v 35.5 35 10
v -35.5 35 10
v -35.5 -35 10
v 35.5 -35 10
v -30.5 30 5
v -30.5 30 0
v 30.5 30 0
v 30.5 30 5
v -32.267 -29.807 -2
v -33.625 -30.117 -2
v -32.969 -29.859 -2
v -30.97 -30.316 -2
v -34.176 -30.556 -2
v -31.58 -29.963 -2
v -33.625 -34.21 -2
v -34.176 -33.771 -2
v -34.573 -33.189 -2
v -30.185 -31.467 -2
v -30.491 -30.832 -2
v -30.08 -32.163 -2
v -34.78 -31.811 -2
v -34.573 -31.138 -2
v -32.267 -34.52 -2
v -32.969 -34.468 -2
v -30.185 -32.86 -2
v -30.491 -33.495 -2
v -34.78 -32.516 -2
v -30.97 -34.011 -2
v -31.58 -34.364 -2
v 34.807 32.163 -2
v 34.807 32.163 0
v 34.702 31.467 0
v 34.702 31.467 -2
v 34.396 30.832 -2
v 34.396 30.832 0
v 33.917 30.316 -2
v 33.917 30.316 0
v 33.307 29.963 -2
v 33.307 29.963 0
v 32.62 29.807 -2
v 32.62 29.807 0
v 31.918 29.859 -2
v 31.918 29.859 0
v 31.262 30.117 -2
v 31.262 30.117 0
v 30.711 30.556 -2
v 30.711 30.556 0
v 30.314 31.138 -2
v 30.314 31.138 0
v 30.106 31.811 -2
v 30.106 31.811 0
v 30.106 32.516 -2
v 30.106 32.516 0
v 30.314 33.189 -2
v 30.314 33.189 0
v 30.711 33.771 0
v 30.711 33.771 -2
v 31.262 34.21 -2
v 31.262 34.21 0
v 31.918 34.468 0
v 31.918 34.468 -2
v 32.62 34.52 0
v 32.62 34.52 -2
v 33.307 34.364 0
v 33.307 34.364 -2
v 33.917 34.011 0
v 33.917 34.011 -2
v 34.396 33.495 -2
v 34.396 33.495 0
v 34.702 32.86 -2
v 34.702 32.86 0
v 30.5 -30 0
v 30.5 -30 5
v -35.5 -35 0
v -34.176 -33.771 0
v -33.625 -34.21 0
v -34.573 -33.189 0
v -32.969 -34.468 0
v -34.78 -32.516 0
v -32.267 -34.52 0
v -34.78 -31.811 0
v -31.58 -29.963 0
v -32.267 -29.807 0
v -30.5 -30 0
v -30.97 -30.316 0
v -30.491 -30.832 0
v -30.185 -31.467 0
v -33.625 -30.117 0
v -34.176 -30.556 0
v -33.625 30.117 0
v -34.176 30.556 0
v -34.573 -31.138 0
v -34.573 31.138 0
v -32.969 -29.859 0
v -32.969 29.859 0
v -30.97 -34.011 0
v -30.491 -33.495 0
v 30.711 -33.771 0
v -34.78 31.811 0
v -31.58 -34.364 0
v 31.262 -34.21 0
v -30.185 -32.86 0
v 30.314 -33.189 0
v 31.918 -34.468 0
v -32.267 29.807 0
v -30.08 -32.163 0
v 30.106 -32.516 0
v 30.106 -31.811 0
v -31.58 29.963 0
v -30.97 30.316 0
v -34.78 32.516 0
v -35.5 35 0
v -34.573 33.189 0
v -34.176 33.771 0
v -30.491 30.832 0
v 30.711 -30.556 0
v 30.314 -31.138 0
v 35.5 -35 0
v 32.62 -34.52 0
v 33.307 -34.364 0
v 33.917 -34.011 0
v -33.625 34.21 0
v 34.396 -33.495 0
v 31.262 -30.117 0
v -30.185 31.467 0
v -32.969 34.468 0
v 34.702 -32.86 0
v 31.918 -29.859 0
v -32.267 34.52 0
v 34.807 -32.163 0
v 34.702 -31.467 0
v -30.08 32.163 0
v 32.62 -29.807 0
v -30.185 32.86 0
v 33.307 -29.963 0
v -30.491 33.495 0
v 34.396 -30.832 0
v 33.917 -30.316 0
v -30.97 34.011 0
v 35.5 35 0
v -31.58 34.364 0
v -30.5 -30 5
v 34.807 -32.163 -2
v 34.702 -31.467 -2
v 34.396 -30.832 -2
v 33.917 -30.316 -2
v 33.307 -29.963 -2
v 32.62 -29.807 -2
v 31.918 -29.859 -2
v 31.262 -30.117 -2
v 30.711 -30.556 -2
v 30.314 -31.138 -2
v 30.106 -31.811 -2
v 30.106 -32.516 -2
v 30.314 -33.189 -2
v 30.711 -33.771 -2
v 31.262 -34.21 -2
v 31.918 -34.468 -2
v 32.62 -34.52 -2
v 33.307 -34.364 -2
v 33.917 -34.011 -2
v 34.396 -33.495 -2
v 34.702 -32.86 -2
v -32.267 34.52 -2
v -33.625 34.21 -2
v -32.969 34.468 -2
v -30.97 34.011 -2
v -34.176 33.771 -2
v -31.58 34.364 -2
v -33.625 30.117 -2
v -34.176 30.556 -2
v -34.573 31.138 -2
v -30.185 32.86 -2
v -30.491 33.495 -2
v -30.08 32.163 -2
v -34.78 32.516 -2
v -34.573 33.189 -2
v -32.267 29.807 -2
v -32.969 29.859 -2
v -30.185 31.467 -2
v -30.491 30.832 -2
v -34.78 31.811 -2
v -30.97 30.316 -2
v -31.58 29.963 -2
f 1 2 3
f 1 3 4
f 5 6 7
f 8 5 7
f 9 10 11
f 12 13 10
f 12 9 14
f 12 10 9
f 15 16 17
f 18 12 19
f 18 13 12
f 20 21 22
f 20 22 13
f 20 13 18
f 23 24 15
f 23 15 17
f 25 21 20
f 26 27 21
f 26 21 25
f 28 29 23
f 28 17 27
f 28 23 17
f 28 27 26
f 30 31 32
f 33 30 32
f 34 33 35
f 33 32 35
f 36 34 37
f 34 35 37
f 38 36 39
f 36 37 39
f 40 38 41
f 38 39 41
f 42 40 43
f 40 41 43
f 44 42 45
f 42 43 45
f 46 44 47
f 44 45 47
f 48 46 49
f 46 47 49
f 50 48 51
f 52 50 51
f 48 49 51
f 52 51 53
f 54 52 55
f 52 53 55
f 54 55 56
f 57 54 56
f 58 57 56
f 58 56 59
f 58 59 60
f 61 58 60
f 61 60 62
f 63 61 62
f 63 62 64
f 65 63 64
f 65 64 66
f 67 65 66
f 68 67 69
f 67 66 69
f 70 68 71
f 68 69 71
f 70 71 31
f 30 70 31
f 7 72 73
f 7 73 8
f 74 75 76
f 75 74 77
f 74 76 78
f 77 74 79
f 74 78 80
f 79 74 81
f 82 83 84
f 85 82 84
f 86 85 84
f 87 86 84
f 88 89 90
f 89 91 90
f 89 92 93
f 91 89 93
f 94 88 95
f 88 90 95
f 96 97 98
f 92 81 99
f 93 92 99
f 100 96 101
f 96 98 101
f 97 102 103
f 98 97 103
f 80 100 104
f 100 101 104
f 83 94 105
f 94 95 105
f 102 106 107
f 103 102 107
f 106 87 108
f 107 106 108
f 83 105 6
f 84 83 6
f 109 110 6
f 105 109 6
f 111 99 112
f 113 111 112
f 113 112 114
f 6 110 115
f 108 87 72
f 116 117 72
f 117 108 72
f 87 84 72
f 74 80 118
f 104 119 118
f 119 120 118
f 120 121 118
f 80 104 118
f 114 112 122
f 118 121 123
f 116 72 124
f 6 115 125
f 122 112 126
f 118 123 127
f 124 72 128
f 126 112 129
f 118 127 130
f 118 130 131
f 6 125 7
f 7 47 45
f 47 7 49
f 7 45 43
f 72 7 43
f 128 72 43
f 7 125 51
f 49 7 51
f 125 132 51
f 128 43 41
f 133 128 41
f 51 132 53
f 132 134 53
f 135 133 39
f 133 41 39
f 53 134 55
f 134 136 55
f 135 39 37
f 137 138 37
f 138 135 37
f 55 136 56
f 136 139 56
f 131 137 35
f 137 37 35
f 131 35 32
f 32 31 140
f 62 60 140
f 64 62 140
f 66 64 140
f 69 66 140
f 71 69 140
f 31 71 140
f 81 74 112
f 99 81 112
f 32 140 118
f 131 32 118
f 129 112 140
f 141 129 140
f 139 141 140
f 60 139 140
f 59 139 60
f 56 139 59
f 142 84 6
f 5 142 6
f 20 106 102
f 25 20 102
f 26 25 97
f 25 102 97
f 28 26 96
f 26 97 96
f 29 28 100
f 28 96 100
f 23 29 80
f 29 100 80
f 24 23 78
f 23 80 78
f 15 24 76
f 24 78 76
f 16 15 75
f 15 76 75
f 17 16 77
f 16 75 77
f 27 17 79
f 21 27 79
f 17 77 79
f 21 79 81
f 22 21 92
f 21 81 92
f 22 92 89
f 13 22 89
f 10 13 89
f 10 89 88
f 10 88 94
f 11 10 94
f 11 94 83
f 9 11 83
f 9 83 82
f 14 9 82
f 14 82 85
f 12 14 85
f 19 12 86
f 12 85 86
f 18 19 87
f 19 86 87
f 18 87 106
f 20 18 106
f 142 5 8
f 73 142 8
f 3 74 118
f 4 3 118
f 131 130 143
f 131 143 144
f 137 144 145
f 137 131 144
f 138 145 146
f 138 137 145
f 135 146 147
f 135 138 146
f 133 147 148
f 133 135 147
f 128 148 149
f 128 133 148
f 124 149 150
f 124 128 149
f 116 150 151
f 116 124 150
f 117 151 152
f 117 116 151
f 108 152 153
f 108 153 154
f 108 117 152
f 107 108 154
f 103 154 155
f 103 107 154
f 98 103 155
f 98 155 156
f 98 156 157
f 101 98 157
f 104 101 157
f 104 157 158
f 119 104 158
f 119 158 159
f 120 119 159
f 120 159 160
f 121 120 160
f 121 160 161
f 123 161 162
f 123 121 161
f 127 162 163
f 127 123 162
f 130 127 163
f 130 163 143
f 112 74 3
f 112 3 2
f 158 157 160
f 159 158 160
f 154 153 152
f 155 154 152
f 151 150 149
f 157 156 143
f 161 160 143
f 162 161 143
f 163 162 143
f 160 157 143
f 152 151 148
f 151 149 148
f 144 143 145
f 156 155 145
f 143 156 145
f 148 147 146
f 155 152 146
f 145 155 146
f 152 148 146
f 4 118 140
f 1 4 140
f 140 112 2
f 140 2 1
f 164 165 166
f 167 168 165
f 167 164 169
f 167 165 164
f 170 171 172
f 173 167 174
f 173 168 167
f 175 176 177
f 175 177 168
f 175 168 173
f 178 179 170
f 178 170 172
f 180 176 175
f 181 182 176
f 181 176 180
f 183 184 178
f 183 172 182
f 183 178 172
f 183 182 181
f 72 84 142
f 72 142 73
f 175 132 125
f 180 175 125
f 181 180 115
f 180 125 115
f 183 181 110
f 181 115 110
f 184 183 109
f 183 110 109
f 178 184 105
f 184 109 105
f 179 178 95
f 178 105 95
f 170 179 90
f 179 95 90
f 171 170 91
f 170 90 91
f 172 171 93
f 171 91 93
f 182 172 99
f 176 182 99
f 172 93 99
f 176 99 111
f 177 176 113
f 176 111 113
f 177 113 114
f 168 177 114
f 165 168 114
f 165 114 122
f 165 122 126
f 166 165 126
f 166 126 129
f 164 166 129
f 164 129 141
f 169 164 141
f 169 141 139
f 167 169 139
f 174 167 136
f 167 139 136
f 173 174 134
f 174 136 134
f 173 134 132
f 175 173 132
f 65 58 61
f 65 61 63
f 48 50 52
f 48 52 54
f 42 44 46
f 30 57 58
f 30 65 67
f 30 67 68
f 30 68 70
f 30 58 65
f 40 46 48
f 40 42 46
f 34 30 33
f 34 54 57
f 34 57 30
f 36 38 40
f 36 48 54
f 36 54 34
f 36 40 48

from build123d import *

# Parameters (mm, degrees)
F0_W     = 71
F0_H     = 70
F1_DEPTH = 10
F2_T     = -5
F3_R     = 2.36344
F4_R     = 2.36344
F7_DEPTH = 2
F5_R     = 2.36344
F6_R     = 2.36344
F8_DEPTH = 2


with BuildPart() as f1:
    # F0 (on Top) → F1 (new body)
    with BuildSketch(Plane.XY):
        Rectangle(F0_W, F0_H)
    extrude(amount=F1_DEPTH)

    # F2
    f2_openings = [f1.faces().sort_by_distance(p)[0] for p in [
        (0, 0, 0),
    ]]
    offset(amount=F2_T, openings=f2_openings)

    # F3 (on face) + F4 (on Top) → F7 (join)
    with BuildSketch(Plane(origin=(0, 0, 0), x_dir=(1, 0, 0), z_dir=(0, 0, -1))):
        with Locations((-32.44344, 32.1634384014)):
            Circle(F3_R)
    with BuildSketch(Plane.XY):
        with Locations((32.44344, -32.1634384014)):
            Circle(F4_R)
    extrude(amount=F7_DEPTH, dir=(0, 0, -1))

    # F5 (on face) + F6 (on face) → F8 (join)
    with BuildSketch(Plane(origin=(0, 0, 0), x_dir=(1, 0, 0), z_dir=(0, 0, -1))):
        with Locations((-32.44344, -32.1634384014)):
            Circle(F5_R)
    with BuildSketch(Plane(origin=(0, 0, 0), x_dir=(1, 0, 0), z_dir=(0, 0, -1))):
        with Locations((32.44344, -32.1634384014)):
            Circle(F6_R)
    extrude(amount=F8_DEPTH)


solid = f1.part
